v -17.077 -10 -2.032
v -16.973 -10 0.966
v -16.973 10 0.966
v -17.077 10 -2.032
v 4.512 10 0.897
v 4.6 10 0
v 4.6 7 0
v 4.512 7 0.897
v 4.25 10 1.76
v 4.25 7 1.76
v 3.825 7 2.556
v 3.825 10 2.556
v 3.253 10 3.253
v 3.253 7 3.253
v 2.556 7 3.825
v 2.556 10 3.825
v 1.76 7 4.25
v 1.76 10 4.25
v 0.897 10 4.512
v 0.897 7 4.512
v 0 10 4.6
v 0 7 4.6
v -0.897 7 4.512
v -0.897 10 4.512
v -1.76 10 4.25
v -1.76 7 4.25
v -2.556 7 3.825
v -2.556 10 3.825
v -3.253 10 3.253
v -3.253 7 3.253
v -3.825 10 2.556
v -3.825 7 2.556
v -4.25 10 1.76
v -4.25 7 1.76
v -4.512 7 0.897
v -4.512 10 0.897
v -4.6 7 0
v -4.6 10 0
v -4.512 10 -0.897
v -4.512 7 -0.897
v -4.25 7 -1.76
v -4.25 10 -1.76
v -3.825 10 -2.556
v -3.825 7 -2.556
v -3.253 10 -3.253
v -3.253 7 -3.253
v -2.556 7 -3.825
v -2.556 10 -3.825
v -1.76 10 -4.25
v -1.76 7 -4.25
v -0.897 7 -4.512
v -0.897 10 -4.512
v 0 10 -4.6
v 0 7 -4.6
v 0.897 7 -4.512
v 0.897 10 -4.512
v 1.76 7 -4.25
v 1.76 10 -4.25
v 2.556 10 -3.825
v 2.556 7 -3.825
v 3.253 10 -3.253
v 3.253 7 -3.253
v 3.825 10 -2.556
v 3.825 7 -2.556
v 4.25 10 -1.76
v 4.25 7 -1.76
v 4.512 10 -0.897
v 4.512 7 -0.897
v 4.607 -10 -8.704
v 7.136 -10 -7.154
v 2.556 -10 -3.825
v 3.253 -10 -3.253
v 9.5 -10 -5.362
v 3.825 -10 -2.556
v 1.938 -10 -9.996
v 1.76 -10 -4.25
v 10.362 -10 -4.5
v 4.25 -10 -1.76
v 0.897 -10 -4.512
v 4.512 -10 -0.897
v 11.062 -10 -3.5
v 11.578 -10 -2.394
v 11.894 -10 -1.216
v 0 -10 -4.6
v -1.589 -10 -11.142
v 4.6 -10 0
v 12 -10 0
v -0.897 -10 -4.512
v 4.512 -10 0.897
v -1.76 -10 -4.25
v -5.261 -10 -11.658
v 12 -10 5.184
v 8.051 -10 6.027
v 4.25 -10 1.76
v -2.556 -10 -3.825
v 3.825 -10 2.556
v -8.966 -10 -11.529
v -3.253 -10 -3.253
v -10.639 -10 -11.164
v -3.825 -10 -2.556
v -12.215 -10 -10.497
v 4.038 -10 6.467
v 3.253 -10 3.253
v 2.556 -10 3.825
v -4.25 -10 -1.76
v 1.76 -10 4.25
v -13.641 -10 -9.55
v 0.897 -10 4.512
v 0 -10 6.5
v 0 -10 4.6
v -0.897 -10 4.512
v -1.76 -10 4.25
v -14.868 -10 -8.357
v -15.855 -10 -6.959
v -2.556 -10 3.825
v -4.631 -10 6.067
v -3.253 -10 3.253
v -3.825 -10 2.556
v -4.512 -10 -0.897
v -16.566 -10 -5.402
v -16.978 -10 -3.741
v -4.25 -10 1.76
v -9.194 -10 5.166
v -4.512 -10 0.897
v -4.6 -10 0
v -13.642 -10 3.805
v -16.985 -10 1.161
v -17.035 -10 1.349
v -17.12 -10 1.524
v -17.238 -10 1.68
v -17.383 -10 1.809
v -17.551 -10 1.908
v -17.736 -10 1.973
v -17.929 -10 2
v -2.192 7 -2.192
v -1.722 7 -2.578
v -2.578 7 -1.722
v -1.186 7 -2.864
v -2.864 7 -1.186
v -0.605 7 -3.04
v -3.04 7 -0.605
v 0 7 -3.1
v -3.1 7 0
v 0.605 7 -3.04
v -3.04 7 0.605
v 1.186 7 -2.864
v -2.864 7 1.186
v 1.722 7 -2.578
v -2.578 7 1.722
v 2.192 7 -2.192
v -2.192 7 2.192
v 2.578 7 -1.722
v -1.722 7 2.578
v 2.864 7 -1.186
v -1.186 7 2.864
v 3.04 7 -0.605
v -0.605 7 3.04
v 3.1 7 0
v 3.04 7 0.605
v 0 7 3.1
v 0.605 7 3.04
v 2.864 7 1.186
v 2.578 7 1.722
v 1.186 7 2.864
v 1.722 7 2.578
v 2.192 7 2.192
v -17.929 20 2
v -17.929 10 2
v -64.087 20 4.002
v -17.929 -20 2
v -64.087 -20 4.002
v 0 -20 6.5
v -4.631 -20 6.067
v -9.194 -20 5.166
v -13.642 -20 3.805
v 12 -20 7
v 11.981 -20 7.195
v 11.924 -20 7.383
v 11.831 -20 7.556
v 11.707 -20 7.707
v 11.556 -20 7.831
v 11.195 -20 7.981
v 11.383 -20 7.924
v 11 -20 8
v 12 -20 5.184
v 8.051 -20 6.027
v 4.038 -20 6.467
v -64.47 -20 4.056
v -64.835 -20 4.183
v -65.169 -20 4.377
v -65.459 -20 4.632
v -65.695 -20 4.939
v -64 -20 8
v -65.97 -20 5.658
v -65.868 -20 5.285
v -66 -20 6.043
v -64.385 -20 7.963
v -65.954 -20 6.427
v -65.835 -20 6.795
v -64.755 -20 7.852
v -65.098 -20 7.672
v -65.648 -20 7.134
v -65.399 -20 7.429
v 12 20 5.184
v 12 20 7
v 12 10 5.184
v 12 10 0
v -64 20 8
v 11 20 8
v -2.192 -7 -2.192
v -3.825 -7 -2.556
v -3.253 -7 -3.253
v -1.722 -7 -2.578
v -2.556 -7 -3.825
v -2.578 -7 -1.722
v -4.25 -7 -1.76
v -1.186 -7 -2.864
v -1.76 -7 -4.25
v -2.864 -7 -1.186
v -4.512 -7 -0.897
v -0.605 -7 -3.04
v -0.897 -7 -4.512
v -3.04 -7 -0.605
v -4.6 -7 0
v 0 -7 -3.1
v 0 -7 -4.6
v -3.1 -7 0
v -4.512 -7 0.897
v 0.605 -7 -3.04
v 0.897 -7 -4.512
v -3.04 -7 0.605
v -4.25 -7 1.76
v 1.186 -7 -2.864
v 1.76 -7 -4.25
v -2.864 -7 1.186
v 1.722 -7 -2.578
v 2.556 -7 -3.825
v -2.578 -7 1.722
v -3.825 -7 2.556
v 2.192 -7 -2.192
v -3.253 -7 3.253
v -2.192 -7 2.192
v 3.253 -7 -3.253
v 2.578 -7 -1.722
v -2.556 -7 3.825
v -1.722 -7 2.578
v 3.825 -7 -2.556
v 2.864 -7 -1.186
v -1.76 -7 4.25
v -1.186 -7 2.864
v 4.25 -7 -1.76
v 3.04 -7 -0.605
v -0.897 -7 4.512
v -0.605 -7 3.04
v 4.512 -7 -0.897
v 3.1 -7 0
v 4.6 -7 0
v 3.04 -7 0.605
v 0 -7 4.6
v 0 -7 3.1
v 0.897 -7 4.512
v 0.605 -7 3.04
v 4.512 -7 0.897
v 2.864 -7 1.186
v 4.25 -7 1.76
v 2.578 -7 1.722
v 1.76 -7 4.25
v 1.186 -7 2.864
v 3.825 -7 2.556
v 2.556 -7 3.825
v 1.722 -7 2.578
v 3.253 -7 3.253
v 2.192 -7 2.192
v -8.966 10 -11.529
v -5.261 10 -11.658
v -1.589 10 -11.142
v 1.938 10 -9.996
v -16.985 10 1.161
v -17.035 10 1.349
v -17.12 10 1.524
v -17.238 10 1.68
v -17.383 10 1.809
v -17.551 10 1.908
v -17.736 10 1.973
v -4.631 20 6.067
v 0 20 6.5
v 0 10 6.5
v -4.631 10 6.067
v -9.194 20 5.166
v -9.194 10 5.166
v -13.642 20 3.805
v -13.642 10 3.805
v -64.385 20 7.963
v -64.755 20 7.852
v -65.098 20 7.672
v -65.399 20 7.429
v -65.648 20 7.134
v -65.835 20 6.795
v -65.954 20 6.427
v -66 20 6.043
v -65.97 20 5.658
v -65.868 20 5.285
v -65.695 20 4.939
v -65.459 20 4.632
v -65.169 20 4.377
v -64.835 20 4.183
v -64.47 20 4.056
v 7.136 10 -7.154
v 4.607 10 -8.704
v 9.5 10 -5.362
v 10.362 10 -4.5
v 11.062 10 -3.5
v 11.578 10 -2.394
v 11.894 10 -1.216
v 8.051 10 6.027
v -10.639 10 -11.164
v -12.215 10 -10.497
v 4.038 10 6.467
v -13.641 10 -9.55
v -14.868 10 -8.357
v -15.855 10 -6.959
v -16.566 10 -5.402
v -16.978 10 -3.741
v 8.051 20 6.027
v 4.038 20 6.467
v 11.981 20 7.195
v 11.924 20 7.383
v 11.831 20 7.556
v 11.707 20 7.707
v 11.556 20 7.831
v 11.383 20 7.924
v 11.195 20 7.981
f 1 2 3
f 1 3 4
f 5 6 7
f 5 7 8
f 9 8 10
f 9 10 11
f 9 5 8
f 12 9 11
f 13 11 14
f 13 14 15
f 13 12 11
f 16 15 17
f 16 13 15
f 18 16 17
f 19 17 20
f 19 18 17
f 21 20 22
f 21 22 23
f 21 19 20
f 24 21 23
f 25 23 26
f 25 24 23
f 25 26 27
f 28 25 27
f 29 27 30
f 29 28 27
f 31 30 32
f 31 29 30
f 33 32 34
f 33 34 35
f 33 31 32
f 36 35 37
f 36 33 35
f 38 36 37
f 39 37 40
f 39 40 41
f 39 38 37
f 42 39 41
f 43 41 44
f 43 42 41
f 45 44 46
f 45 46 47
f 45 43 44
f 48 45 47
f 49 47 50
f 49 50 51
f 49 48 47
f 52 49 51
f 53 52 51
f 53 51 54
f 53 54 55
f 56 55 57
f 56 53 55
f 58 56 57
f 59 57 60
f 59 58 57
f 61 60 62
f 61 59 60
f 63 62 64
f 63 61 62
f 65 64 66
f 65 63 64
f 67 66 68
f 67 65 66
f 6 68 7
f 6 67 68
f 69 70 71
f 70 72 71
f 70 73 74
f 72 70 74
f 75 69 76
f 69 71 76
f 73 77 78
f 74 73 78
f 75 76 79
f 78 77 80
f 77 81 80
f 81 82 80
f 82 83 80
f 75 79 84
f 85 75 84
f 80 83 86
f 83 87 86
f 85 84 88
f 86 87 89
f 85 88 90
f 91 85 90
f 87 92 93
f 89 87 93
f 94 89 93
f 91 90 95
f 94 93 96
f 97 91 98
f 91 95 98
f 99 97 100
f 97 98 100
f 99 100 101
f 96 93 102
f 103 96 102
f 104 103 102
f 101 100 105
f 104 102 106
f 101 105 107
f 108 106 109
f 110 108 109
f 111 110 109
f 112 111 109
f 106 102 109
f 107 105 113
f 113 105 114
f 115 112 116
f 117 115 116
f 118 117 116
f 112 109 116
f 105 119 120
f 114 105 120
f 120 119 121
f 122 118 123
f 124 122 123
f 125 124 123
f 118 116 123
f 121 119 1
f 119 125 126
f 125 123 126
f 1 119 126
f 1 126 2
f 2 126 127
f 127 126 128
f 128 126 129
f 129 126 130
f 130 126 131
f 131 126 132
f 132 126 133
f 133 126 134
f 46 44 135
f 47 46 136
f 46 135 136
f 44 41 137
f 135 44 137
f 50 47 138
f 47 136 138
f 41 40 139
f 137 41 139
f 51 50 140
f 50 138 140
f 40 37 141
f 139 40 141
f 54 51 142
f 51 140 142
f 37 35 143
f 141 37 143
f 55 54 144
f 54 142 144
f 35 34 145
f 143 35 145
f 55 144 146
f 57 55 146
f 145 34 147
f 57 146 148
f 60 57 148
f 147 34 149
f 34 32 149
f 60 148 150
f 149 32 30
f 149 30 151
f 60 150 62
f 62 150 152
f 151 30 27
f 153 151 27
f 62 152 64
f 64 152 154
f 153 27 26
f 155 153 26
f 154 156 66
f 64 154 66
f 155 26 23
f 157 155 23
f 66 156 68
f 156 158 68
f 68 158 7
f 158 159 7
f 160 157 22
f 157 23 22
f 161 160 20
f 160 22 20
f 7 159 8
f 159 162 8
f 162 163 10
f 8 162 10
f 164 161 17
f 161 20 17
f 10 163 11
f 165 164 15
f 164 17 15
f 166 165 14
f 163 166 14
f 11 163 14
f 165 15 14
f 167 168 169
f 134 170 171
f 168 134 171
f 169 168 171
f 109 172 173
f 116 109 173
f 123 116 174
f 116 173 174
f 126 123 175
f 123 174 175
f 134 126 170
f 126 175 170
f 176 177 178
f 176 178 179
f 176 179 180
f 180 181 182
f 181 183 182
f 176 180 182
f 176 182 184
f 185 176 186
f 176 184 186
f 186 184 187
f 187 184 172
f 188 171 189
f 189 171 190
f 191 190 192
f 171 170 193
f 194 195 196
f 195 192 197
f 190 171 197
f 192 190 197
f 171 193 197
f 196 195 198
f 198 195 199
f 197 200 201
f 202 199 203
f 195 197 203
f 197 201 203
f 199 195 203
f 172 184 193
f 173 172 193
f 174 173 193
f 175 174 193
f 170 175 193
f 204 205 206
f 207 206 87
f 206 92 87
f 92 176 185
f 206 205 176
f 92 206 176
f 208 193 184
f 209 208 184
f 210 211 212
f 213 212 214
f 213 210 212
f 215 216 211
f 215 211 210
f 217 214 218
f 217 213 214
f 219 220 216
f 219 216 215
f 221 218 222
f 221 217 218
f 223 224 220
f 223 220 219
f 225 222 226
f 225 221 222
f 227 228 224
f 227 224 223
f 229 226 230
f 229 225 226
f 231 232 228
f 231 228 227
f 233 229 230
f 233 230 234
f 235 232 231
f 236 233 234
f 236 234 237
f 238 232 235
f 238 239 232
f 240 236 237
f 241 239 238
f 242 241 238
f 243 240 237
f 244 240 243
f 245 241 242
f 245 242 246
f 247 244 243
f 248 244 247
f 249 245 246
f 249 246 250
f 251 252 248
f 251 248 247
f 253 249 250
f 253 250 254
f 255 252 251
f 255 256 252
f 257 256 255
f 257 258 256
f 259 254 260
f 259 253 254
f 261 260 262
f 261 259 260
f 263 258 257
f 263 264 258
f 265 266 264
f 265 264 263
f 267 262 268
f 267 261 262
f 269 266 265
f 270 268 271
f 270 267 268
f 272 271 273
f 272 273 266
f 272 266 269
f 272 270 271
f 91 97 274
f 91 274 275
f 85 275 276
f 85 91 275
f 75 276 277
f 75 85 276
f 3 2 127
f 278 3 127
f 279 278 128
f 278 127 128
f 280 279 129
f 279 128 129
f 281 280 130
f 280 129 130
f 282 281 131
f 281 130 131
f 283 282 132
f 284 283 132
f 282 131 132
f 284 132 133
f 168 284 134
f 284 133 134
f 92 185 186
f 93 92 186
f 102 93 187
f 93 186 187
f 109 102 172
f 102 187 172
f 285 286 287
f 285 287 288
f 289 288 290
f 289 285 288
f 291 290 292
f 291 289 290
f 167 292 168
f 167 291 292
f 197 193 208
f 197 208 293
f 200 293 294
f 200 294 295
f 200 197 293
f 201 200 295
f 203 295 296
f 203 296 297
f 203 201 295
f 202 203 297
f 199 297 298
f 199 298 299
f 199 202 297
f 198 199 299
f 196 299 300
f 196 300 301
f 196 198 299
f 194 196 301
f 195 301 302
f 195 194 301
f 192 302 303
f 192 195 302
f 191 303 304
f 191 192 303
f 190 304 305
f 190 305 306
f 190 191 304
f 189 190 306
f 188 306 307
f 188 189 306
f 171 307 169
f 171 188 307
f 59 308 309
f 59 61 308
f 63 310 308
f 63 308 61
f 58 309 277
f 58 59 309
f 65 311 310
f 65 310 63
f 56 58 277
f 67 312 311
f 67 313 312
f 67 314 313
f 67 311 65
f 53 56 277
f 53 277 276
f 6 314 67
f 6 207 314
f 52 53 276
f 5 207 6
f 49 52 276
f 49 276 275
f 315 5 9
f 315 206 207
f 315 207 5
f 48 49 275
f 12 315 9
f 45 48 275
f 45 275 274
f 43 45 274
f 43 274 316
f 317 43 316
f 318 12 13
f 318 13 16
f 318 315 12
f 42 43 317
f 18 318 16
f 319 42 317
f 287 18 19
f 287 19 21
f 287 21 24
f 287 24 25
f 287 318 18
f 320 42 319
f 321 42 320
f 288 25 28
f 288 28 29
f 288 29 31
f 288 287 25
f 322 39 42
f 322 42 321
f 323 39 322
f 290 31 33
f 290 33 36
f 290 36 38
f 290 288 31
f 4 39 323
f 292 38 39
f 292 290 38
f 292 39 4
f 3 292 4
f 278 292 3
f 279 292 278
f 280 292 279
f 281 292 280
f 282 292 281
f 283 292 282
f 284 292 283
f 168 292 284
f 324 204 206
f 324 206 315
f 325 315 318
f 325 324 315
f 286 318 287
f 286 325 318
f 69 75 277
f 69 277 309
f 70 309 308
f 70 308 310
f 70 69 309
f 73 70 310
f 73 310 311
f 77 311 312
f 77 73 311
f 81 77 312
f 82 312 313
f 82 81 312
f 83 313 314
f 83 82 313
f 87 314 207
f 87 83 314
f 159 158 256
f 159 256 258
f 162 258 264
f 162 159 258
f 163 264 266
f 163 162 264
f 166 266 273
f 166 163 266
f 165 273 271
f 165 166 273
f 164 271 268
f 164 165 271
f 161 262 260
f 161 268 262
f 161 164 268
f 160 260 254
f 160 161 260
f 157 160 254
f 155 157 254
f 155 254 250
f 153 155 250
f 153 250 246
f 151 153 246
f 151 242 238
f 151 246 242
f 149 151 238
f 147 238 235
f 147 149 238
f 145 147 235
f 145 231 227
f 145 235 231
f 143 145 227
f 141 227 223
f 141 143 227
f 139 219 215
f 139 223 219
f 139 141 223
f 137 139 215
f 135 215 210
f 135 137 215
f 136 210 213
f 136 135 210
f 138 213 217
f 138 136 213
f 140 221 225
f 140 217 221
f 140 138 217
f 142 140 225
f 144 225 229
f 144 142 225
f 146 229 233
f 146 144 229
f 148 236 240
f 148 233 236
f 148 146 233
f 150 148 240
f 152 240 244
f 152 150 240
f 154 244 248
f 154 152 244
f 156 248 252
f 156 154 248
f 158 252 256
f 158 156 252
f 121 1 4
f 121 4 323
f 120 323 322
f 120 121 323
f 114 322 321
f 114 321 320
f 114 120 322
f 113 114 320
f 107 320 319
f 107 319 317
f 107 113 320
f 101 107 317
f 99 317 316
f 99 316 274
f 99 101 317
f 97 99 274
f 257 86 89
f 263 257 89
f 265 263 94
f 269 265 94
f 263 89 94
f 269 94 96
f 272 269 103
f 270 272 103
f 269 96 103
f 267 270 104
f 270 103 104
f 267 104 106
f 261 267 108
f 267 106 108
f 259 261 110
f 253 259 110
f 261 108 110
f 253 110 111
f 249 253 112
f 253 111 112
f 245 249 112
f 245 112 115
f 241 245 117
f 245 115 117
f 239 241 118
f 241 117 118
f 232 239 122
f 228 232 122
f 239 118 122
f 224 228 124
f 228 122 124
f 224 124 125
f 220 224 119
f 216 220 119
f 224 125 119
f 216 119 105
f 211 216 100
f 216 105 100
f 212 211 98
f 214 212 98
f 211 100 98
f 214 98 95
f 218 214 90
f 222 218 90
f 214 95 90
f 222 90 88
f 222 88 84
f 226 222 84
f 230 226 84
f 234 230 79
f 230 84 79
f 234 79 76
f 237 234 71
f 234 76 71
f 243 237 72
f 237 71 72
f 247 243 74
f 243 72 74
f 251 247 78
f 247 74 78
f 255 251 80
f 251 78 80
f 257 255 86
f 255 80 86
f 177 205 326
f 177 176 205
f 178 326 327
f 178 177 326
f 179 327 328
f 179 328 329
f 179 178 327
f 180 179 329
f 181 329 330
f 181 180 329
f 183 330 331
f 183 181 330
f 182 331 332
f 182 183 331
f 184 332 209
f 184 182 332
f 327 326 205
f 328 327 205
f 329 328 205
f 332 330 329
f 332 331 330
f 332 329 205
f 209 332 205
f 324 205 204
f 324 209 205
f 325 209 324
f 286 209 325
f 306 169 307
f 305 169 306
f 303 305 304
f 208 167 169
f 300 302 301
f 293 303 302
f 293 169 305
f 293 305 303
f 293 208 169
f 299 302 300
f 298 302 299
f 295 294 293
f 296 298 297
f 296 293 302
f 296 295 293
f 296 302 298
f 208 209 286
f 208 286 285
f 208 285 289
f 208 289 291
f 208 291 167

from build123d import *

# Parameters (mm, degrees)
SKETCH_R        = 3.1
PAD_DEPTH       = 20
POCKET001_DEPTH = 10
SKETCH001_R     = 4.6
POCKET_DEPTH    = 3


with BuildPart() as part:
    # Sketch → Pad (new body, symmetric)
    with BuildSketch(Plane.XZ):
        with BuildLine():
            Line((-64, 8), (11, 8))
            ThreePointArc((12, 7), (11.707107, 7.707107), (11, 8))
            Line((12, 7), (12, 0))
            ThreePointArc((9.499513, -5.362311), (11.344155, -2.958328), (12, 0))
            ThreePointArc((1.937819, -9.996123), (5.890842, -7.960183), (9.499513, -5.362311))
            ThreePointArc((-8.966462, -11.52862), (-3.413443, -11.48016), (1.937819, -9.996123))
            ThreePointArc((-17.077228, -2.032133), (-14.868336, -8.357429), (-8.966462, -11.52862))
            Line((-16.97253, 0.96604), (-17.077228, -2.032133))
            ThreePointArc((-16.97253, 0.96604), (-17.237697, 1.679846), (-17.928591, 2))
            Line((-17.928591, 2), (-64.086659, 4.001878))
            ThreePointArc((-64, 8), (-65.99953, 6.04334), (-64.086659, 4.001878))
        make_face()
        Circle(SKETCH_R, mode=Mode.SUBTRACT)
    extrude(amount=PAD_DEPTH, both=True)

    # Sketch007 → Pocket001 (cut)
    with BuildSketch(Plane.XZ.offset(20)):
        with BuildLine():
            Line((12, 5.184354), (12, -34.815646))
            Line((12, -34.815646), (-17.928591, -34.815646))
            Line((-17.928591, 2), (-17.928591, -34.815646))
            ThreePointArc((0, 6.5), (-9.194185, 5.165908), (-17.928591, 2))
            ThreePointArc((12, 5.184354), (6.049918, 6.29748), (0, 6.5))
        make_face()
    pocket001 = extrude(amount=-POCKET001_DEPTH, mode=Mode.SUBTRACT)

    # Sketch001 → Pocket (cut)
    with BuildSketch(Plane.XZ.offset(10)):
        Circle(SKETCH001_R)
    pocket = extrude(amount=-POCKET_DEPTH, mode=Mode.SUBTRACT)

    # Mirrored: Pocket, Pocket001 across XZ
    add(pocket.mirror(Plane.XZ), mode=Mode.SUBTRACT)
    add(pocket001.mirror(Plane.XZ), mode=Mode.SUBTRACT)


solid = part.part
